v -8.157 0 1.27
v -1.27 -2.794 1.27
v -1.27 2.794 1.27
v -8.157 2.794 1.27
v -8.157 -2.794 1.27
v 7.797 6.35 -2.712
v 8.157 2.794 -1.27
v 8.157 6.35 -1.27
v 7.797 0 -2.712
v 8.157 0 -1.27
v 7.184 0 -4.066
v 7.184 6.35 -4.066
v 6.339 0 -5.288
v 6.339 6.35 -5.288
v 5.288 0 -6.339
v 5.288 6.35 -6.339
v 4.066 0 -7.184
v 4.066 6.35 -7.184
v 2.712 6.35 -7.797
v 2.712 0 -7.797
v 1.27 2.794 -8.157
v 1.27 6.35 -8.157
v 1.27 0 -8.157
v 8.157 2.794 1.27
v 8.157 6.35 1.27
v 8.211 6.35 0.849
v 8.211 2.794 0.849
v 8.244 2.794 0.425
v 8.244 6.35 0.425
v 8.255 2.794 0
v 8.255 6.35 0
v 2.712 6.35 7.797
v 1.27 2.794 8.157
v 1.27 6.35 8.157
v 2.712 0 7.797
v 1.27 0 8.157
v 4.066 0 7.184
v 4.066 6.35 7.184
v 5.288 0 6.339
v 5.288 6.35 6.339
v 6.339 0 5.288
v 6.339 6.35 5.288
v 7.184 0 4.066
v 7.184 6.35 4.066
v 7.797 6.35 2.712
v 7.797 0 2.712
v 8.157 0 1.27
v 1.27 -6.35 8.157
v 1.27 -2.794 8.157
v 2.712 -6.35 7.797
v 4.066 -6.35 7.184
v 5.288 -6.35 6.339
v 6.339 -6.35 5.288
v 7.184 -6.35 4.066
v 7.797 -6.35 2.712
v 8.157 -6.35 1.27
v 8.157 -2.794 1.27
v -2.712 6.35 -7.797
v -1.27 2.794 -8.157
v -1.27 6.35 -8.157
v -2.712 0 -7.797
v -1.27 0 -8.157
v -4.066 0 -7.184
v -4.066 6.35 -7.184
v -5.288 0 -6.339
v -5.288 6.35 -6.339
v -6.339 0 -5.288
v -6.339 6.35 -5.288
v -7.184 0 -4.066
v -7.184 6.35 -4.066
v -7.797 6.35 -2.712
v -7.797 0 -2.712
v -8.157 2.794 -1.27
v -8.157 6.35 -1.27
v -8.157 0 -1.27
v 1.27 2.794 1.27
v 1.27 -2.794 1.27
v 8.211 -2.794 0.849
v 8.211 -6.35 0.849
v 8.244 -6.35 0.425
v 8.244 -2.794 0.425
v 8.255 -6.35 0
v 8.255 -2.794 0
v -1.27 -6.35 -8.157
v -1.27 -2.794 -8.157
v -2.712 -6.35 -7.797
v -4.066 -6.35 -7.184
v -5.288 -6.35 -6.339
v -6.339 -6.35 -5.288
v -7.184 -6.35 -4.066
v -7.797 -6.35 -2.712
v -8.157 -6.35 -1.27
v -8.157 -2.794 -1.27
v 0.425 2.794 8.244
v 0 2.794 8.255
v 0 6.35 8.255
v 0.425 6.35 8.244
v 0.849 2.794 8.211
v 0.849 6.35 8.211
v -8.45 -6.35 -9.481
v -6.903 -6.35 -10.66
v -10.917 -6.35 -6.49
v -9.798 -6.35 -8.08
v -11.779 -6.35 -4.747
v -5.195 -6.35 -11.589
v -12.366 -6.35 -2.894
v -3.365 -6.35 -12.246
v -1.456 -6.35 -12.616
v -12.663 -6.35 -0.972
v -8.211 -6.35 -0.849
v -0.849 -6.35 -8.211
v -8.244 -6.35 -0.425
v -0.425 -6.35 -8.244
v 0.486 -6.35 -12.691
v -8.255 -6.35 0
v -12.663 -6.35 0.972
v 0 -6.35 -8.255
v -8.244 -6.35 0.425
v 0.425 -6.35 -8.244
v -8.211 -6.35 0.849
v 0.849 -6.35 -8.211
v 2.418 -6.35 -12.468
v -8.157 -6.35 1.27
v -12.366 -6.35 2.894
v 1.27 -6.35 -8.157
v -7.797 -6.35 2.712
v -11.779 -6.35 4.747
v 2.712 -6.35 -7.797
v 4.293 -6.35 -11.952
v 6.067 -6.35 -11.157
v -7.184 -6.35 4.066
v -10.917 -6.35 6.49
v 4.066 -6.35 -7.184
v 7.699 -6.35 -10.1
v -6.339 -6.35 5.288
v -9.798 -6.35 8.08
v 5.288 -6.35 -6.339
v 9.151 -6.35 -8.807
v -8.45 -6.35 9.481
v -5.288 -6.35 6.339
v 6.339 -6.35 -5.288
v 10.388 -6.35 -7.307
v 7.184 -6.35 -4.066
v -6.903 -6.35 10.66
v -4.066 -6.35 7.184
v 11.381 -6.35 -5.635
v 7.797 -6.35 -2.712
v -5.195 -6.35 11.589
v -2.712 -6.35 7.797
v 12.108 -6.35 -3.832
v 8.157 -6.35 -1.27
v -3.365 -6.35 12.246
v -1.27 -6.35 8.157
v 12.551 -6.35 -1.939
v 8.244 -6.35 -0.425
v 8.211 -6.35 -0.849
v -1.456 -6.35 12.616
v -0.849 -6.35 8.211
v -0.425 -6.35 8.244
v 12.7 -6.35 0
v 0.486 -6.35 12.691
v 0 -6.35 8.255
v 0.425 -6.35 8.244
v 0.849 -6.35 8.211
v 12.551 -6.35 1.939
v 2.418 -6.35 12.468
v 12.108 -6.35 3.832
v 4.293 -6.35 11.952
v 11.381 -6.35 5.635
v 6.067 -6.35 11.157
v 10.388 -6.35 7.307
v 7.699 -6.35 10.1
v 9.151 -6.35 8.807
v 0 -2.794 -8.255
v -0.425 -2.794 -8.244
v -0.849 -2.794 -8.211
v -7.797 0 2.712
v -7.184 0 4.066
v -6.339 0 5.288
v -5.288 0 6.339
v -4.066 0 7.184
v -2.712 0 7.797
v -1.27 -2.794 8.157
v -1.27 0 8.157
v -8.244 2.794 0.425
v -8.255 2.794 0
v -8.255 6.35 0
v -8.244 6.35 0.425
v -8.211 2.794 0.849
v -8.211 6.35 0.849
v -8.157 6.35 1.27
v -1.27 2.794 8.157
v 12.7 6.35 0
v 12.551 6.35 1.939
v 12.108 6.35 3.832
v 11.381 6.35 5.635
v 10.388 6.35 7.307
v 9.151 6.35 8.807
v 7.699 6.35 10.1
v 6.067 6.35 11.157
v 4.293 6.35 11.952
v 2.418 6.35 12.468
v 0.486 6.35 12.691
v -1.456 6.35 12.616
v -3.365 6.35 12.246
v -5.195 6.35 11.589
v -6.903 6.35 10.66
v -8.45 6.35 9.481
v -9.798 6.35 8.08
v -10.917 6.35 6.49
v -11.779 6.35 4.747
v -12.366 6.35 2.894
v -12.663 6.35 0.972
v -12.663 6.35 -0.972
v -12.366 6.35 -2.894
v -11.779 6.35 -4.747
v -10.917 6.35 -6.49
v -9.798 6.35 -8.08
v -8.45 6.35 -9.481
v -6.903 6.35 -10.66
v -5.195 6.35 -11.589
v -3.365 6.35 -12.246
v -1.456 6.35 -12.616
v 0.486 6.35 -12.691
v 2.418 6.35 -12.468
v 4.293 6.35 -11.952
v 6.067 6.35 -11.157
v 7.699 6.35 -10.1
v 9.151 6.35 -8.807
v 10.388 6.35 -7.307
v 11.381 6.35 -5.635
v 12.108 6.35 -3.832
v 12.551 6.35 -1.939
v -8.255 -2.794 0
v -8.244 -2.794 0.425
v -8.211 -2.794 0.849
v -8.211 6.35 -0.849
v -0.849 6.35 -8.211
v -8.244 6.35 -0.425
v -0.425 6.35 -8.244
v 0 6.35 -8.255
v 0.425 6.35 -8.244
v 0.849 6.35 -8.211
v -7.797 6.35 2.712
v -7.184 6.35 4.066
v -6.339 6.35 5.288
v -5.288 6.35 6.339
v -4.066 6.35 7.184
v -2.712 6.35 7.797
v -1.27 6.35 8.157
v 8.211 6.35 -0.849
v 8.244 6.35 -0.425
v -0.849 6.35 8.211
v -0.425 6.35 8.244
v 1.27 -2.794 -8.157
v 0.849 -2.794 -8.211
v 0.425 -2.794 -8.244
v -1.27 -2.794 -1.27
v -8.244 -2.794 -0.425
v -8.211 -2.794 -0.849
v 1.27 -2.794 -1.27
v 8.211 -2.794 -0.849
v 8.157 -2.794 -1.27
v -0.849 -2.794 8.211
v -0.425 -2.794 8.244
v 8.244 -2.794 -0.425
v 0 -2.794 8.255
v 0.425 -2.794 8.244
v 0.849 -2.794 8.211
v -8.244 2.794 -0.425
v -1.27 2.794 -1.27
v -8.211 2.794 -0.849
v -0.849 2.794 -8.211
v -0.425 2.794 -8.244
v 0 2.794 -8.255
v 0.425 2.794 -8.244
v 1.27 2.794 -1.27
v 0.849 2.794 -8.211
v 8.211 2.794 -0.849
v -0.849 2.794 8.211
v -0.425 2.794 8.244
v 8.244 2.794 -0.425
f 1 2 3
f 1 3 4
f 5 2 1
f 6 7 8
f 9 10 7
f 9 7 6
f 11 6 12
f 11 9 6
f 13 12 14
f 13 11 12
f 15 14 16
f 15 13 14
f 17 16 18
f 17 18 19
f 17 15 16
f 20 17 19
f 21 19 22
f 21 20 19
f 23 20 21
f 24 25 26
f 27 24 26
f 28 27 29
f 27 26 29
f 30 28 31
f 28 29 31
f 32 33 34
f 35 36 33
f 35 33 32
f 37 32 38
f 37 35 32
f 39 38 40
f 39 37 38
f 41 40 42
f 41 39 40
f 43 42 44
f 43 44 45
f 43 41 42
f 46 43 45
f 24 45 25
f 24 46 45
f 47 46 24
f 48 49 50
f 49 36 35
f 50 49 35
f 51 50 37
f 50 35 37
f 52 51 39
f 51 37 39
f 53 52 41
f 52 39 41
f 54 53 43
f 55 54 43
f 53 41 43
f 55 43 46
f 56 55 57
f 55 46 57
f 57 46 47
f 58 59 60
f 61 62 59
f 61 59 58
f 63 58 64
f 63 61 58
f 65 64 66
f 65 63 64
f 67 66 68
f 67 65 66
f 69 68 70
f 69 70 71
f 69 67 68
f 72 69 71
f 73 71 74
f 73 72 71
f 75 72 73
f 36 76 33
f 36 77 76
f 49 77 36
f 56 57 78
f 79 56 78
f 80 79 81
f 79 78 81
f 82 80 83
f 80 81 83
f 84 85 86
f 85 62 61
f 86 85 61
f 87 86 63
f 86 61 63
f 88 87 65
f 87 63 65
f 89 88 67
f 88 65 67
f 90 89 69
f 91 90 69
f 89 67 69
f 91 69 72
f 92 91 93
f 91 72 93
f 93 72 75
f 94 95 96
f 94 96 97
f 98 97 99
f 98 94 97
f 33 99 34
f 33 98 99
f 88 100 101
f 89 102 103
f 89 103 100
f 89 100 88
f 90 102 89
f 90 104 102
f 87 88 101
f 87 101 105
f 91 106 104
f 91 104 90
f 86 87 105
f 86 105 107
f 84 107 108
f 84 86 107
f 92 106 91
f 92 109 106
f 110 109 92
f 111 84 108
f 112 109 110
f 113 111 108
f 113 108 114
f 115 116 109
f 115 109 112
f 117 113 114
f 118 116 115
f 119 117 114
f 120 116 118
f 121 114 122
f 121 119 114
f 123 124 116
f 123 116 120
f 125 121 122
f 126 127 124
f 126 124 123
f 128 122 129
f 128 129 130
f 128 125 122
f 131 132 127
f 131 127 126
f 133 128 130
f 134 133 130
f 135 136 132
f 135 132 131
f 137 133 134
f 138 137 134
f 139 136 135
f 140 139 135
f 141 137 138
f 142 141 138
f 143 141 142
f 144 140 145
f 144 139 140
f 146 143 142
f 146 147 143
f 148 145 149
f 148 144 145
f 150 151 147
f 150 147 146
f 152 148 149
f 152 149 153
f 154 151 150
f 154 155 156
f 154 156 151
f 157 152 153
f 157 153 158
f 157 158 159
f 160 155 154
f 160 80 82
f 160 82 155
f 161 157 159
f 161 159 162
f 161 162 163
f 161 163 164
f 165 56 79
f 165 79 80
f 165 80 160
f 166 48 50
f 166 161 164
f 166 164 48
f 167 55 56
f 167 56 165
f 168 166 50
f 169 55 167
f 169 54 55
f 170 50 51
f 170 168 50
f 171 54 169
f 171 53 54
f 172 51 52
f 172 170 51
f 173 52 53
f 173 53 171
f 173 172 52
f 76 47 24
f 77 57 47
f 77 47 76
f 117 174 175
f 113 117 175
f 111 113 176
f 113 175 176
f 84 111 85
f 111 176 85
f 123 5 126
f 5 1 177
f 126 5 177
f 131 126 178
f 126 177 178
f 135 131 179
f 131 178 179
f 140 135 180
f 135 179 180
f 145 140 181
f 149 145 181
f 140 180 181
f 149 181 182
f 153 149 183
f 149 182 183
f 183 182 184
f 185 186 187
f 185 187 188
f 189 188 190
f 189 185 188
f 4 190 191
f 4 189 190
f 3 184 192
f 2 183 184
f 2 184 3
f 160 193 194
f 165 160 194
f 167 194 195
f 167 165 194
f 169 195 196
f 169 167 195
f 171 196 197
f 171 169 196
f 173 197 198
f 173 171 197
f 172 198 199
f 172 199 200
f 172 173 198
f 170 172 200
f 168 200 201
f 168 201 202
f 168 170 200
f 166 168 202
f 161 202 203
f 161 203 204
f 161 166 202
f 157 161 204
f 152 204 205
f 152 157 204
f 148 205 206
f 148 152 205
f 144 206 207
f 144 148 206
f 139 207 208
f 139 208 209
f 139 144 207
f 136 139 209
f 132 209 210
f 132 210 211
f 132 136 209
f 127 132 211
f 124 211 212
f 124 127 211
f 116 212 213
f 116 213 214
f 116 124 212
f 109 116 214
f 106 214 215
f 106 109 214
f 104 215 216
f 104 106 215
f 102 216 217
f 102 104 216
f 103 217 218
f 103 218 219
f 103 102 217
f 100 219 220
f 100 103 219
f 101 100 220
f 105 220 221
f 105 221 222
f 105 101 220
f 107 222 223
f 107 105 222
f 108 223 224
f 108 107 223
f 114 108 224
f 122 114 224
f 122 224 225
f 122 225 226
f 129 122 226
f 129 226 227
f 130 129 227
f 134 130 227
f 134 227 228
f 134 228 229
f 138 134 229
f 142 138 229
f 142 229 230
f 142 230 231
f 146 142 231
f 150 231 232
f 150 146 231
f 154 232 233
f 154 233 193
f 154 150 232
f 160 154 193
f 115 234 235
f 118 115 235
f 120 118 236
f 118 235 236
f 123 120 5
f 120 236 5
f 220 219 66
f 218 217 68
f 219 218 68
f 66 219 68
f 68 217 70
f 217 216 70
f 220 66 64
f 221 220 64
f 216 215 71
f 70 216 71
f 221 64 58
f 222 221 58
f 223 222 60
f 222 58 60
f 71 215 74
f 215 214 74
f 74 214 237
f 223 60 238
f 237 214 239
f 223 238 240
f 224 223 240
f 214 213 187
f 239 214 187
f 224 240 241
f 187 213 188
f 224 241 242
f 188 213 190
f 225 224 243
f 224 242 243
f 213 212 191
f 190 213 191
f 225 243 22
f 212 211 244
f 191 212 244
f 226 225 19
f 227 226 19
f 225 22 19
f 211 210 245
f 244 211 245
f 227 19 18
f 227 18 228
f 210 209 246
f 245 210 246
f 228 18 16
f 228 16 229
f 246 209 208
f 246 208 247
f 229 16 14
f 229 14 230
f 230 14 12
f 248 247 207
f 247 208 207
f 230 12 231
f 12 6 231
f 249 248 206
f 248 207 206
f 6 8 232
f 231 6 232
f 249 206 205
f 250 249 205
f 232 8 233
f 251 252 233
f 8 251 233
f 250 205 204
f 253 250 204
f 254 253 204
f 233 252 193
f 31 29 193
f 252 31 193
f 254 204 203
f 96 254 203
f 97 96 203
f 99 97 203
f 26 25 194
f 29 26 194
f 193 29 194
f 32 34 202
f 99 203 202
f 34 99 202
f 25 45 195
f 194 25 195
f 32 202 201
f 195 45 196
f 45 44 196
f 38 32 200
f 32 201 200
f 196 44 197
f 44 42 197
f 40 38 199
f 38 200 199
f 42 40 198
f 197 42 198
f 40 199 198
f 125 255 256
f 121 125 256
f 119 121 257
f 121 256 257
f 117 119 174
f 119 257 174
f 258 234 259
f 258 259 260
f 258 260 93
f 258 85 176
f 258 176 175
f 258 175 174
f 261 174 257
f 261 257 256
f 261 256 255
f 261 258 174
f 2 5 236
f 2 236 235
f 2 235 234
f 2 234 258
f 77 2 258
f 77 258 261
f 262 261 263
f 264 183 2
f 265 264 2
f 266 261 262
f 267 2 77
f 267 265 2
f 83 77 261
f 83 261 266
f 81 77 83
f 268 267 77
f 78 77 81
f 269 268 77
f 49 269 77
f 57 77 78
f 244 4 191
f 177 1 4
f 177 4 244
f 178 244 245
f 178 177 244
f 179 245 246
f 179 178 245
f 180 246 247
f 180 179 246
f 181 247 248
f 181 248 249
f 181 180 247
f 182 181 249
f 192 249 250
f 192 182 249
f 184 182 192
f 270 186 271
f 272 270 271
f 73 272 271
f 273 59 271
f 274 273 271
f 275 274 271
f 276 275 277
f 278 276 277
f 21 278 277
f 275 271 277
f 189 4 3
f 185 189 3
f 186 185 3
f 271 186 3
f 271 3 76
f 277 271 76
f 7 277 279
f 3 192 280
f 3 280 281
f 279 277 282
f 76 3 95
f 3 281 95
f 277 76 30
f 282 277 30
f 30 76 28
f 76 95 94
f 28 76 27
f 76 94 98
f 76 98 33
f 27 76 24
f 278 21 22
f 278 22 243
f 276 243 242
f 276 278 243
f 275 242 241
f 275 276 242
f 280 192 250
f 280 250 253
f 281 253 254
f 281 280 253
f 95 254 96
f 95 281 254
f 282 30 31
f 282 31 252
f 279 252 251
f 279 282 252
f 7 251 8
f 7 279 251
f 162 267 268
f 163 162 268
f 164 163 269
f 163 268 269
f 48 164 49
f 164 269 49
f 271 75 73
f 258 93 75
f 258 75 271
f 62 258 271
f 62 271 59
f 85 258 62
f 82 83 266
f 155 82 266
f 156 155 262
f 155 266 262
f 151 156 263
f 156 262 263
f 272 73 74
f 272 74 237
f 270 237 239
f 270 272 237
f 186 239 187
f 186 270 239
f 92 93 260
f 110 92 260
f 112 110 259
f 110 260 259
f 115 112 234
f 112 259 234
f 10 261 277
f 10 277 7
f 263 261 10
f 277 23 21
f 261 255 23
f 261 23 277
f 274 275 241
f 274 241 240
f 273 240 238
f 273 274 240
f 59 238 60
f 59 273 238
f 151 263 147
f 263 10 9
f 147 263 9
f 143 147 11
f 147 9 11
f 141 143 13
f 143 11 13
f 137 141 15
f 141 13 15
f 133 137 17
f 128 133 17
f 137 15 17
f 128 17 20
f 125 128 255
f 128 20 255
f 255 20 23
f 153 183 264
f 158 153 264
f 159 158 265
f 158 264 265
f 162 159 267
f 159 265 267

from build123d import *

# Parameters (mm, degrees)
F0_R     = 12.7
F1_DEPTH = 6.35
F0_W     = 1.27
F0_H     = 1.27
F2_DEPTH = 2.794


with BuildPart() as f1:
    # F0 (on Front) → F1 (new body, symmetric)
    with BuildSketch(Plane.XZ):
        Circle(F0_R)
        with BuildLine():
            ThreePointArc((8.1567226875, 1.27), (8.2303939998, 0.636898428), (8.255, 0))
            ThreePointArc((8.255, 0), (8.2303939998, -0.636898428), (8.1567226875, -1.27))
            ThreePointArc((8.1567226875, -1.27), (5.8371664787, -5.8371664787), (1.27, -8.1567226875))
            ThreePointArc((1.27, -8.1567226875), (0.636898428, -8.2303939998), (0, -8.255))
            ThreePointArc((0, -8.255), (-0.636898428, -8.2303939998), (-1.27, -8.1567226875))
            ThreePointArc((-1.27, -8.1567226875), (-5.8371664787, -5.8371664787), (-8.1567226875, -1.27))
            ThreePointArc((-8.1567226875, -1.27), (-8.2303939998, -0.636898428), (-8.255, 0))
            ThreePointArc((-8.255, 0), (-8.2303939998, 0.636898428), (-8.1567226875, 1.27))
            ThreePointArc((-8.1567226875, 1.27), (-5.8371664787, 5.8371664787), (-1.27, 8.1567226875))
            ThreePointArc((-1.27, 8.1567226875), (-0.636898428, 8.2303939998), (0, 8.255))
            ThreePointArc((0, 8.255), (0.636898428, 8.2303939998), (1.27, 8.1567226875))
            ThreePointArc((1.27, 8.1567226875), (5.8371664787, 5.8371664787), (8.1567226875, 1.27))
        make_face(mode=Mode.SUBTRACT)
    extrude(amount=F1_DEPTH, both=True)

    # F0 (on Front) → F2 (join, symmetric)
    with BuildSketch(Plane.XZ):
        with BuildLine():
            Line((1.27, 1.27), (1.27, 8.1567226875))
            ThreePointArc((1.27, 8.1567226875), (0.636898428, 8.2303939998), (0, 8.255))
            Line((0, 8.255), (0, 1.27))
            Line((0, 1.27), (1.27, 1.27))
        make_face()
        with BuildLine():
            Line((0, 1.27), (0, 8.255))
            ThreePointArc((0, 8.255), (-0.636898428, 8.2303939998), (-1.27, 8.1567226875))
            Line((-1.27, 8.1567226875), (-1.27, 1.27))
            Line((-1.27, 1.27), (0, 1.27))
        make_face()
        with Locations((-0.635, 0.635)):
            Rectangle(F0_W, F0_H)
        with Locations((0.635, 0.635)):
            Rectangle(F0_W, F0_H)
        with Locations((0.635, -0.635)):
            Rectangle(F0_W, F0_H)
        with Locations((-0.635, -0.635)):
            Rectangle(F0_W, F0_H)
        with BuildLine():
            ThreePointArc((-1.27, -8.1567226875), (-0.636898428, -8.2303939998), (0, -8.255))
            Line((0, -8.255), (0, -1.27))
            Line((0, -1.27), (-1.27, -1.27))
            Line((-1.27, -1.27), (-1.27, -8.1567226875))
        make_face()
        with BuildLine():
            ThreePointArc((0, -8.255), (0.636898428, -8.2303939998), (1.27, -8.1567226875))
            Line((1.27, -8.1567226875), (1.27, -1.27))
            Line((1.27, -1.27), (0, -1.27))
            Line((0, -1.27), (0, -8.255))
        make_face()
        with BuildLine():
            Line((-8.255, 0), (-1.27, 0))
            Line((-1.27, 0), (-1.27, 1.27))
            Line((-1.27, 1.27), (-8.1567226875, 1.27))
            ThreePointArc((-8.1567226875, 1.27), (-8.2303939998, 0.636898428), (-8.255, 0))
        make_face()
        with BuildLine():
            Line((-1.27, -1.27), (-1.27, 0))
            Line((-1.27, 0), (-8.255, 0))
            ThreePointArc((-8.255, 0), (-8.2303939998, -0.636898428), (-8.1567226875, -1.27))
            Line((-8.1567226875, -1.27), (-1.27, -1.27))
        make_face()
        with BuildLine():
            ThreePointArc((8.1567226875, -1.27), (8.2303939998, -0.636898428), (8.255, 0))
            Line((8.255, 0), (1.27, 0))
            Line((1.27, 0), (1.27, -1.27))
            Line((1.27, -1.27), (8.1567226875, -1.27))
        make_face()
        with BuildLine():
            Line((1.27, 0), (8.255, 0))
            ThreePointArc((8.255, 0), (8.2303939998, 0.636898428), (8.1567226875, 1.27))
            Line((8.1567226875, 1.27), (1.27, 1.27))
            Line((1.27, 1.27), (1.27, 0))
        make_face()
    extrude(amount=F2_DEPTH, both=True)


solid = f1.part
